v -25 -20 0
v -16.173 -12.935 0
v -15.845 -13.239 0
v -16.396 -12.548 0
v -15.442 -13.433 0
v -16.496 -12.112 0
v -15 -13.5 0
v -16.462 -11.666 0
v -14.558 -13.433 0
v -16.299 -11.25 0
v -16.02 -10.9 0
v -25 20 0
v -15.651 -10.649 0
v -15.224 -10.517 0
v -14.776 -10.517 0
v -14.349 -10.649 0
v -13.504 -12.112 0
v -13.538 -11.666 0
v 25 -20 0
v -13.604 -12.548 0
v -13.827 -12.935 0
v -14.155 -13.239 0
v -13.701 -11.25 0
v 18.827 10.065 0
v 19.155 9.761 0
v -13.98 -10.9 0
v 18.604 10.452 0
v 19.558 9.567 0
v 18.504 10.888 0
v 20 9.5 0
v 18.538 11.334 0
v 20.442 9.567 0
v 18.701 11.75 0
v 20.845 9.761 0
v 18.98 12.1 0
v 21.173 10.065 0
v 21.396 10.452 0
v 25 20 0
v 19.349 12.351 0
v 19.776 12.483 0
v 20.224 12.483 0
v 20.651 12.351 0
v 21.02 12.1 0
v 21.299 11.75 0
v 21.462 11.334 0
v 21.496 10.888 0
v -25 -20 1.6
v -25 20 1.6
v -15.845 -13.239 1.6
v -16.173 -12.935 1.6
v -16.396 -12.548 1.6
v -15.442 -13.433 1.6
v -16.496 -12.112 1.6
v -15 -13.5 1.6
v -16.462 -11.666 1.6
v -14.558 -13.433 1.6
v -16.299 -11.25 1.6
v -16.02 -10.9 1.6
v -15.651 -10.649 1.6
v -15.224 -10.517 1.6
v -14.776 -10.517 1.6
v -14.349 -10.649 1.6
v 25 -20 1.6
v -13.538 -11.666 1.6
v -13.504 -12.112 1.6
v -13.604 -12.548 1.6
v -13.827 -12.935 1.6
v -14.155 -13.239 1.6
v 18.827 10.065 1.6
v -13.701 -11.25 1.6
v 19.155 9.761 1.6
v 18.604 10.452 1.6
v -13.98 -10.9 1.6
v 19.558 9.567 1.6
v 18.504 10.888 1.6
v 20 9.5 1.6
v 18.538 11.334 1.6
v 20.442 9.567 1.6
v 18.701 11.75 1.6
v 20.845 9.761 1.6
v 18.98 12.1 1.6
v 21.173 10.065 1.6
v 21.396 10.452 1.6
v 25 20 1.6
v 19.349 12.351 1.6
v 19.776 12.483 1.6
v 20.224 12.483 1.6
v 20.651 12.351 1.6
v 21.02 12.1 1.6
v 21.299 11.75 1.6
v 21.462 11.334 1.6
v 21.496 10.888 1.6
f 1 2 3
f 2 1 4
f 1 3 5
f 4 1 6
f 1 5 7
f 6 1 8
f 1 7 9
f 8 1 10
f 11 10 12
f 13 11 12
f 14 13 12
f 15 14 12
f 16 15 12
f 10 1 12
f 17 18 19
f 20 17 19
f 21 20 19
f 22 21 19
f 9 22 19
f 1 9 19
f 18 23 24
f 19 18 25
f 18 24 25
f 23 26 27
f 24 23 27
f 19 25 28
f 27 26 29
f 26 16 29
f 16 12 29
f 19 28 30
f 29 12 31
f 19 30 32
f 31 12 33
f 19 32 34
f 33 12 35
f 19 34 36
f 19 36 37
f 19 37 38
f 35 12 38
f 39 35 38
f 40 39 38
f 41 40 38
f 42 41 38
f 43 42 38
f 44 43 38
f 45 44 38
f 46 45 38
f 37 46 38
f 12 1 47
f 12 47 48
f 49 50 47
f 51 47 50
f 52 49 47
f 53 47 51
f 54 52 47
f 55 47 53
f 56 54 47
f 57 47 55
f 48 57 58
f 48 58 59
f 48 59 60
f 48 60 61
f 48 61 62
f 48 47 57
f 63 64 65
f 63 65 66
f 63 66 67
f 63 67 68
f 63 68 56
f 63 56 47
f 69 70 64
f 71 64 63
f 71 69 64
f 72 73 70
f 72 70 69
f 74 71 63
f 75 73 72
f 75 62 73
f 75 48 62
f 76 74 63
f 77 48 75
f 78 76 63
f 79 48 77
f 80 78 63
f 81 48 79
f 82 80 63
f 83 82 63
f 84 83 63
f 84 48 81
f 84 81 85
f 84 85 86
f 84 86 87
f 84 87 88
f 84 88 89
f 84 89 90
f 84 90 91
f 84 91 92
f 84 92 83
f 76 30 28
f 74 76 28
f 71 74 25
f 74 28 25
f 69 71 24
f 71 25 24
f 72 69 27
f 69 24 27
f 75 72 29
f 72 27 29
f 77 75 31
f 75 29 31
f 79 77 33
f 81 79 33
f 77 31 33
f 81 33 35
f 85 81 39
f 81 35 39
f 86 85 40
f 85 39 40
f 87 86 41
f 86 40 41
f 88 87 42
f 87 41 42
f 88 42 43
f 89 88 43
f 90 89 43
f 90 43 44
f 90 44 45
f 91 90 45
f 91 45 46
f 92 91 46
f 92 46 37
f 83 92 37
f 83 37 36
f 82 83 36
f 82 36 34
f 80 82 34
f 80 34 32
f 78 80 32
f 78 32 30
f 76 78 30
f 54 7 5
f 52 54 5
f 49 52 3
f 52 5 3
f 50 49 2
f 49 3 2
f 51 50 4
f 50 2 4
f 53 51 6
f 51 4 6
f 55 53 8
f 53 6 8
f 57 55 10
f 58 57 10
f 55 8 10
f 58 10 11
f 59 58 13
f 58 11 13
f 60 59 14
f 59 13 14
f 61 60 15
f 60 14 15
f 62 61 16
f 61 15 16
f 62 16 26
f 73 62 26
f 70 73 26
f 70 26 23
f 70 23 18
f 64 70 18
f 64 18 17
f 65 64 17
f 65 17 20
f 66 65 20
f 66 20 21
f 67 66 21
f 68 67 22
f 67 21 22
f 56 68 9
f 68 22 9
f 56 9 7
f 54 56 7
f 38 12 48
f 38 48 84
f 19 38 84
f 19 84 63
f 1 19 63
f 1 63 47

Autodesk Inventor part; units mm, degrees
ref_plane "YZ Plane" through (0, 0, 0) normal (1, 0, 0) x (0, 1, 0)
ref_plane "XZ Plane" through (0, 0, 0) normal (0, 1, 0) x (-1, 0, 0)
ref_plane "XY Plane" through (0, 0, 0) normal (0, 0, 1) x (1, 0, 0)
sketch "Sketch1" plane through (0, 0, 0) normal (0, 0, 1) x (1, 0, 0)
  line L0 (25, -20) -> (-25, -20)
  line L1 (-25, -20) -> (-25, 20)
  line L2 (-25, 20) -> (25, 20)
  line L3 (25, 20) -> (25, -20)
  line L4 (25, 0) -> (-25, 0) construction
  point P0 (0, 0)
  point P1 (0, 0)
  dimension "d0" = 50
  dimension "d1" = 40
extrude "Extrusion1" add sketch "Sketch1" along normal blind 1.6
sketch "Sketch2" plane through (0, 0, 1.6) normal (0, 0, 1) x (1, 0, 0)
  line L0 (-25, 18.8203) -> (25.4554, 18.8203) construction
  line L1 (25.4554, 18.8203) -> (25.4554, -19.9538) construction
  line L2 (25.4554, -19.9538) -> (-25, -19.9538) construction
  line L3 (-25, -19.9538) -> (-25, 18.8203) construction
  point P0 (0, 0)
sketch "Sketch3" plane through (0, 0, 1.6) normal (0, 0, 1) x (1, 0, 0)
  line L0 (-25, -20) -> (-25, 20) projected
  line L1 (25, -20) -> (-25, -20) projected
  point P0 (0, 0)
  point P1 (-15, -12)
  point P2 (20, 11)
  dimension "d5" = 8
  dimension "d6" = 10
  dimension "d7" = 45
  dimension "d8" = 31
hole "Hole1" at (20, 11, 1.6) at (-15, -12, 1.6) direction (0, 0, -1) diameter 3 end through all
properties part number "BOARD_IMAGE"
